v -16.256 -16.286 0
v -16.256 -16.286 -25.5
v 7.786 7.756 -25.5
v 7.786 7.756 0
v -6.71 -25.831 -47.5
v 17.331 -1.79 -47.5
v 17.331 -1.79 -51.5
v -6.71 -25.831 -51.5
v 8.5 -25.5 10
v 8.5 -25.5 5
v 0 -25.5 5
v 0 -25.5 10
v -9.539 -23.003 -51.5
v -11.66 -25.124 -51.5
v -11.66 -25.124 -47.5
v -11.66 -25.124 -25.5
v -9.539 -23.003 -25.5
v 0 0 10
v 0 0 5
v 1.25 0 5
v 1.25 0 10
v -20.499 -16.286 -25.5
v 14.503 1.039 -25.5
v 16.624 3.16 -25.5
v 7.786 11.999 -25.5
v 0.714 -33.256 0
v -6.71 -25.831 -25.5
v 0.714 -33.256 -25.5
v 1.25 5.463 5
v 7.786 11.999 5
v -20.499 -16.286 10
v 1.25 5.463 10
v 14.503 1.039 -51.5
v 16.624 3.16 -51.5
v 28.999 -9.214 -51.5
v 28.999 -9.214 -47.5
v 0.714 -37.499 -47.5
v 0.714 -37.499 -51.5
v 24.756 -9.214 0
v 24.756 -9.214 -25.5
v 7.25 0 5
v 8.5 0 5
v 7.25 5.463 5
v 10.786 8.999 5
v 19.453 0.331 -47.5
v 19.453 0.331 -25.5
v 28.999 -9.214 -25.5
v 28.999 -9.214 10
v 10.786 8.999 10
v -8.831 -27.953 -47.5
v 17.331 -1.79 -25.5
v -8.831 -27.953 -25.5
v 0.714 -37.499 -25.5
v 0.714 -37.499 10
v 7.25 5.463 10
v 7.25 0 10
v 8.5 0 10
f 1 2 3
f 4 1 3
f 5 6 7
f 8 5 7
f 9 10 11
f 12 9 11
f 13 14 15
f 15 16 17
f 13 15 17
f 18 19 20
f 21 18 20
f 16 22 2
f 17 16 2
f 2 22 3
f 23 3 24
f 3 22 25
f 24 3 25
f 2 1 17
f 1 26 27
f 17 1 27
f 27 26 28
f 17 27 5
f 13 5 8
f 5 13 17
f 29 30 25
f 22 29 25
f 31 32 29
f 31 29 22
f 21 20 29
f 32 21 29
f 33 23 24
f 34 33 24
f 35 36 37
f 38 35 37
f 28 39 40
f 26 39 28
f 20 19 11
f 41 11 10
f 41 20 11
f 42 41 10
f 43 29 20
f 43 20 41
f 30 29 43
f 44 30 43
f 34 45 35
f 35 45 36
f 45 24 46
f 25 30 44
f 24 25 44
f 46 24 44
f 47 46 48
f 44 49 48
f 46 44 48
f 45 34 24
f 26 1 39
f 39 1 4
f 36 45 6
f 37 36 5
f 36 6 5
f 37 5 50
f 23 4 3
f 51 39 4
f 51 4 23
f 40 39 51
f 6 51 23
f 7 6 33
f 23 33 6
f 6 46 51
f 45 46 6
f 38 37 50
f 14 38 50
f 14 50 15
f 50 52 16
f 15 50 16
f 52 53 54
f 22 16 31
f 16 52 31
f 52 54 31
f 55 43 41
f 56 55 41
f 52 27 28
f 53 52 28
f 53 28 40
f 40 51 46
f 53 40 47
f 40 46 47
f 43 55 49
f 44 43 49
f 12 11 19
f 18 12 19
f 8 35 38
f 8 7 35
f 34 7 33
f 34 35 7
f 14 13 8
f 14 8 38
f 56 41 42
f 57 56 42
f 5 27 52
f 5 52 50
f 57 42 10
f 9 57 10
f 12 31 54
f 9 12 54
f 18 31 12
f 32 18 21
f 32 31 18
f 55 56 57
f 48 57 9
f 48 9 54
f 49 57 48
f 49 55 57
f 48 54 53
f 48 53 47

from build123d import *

# Parameters (mm, degrees)
SKETCH_1_W          = 8.5
SKETCH_1_H          = 25.5
EXTRUDE_1_DEPTH     = 5
EXTRUDE_2_DEPTH     = 5
SKETCH_3_W          = 8.5
SKETCH_3_H          = 25.5
EXTRUDE_3_DEPTH     = 5
EXTRUDE_4_DEPTH     = 25.5
EXTRUDE_5_DEPTH     = 35.5
CUT_EXTRUDE_1_DEPTH = 5
CUT_EXTRUDE_2_DEPTH = 25.5
EXTRUDE_6_REACH     = 63.804
SKETCH_8_W          = 22
SKETCH_8_H          = 4
EXTRUDE_7_DEPTH     = 4
SKETCH_10_W         = 26
SKETCH_10_H         = 34
CUT_EXTRUDE_3_DEPTH = 4


with BuildPart() as part:
    # 草图1 → 凸台-拉伸1 (new body)
    with BuildSketch(Plane.XY):
        Polygon((-16.963203436, -12.75), (4.25, -33.963203436), (25.463203436, -12.75), (4.25, 8.463203436), align=None)
        with Locations((4.25, -12.75)):
            Rectangle(SKETCH_1_W, SKETCH_1_H, mode=Mode.SUBTRACT)
    extrude(amount=EXTRUDE_1_DEPTH)

    # 草图2 → 凸台-拉伸2 (add)
    with BuildSketch(Plane.XY.offset(5)):
        Polygon((1.25, 0), (1.25, 5.463203436), (-16.963203436, -12.75), (4.25, -33.963203436), (25.463203436, -12.75), (7.25, 5.463203436), (7.25, 0), (8.5, 0), (8.5, -25.5), (0, -25.5), (0, 0), align=None)
    extrude(amount=EXTRUDE_2_DEPTH)

    # 草图3 → 凸台-拉伸3 (add)
    with BuildSketch(Plane.XY.offset(5)):
        with Locations((4.25, -12.75)):
            Rectangle(SKETCH_3_W, SKETCH_3_H)
    extrude(amount=-EXTRUDE_3_DEPTH)

    # 草图4 → 凸台-拉伸4 (add)
    with BuildSketch(Plane(origin=(0, 0, 0), x_dir=(-1, 0, 0), z_dir=(0, 0, -1))):
        Polygon((-25.463203436, -12.75), (-4.25, -33.963203436), (16.963203436, -12.75), (-4.25, 8.463203436), align=None)
        Polygon((12.720562748, -12.75), (-4.25, 4.220562748), (-21.220562748, -12.75), (-4.25, -29.720562748), align=None, mode=Mode.SUBTRACT)
    extrude(amount=EXTRUDE_4_DEPTH)

    # 草图5 → 凸台-拉伸5 (add)
    with BuildSketch(Plane.XY.offset(10)):
        Polygon((4.25, 8.463203436), (25.463203436, -12.75), (28.998737342, -9.214466094), (7.785533906, 11.998737342), align=None)
        Polygon((-16.963203436, -12.75), (-20.498737342, -16.285533906), (0.714466094, -37.498737342), (4.25, -33.963203436), align=None)
    extrude(amount=-EXTRUDE_5_DEPTH)

    # 草图6 → 切除-拉伸1 (cut)
    with BuildSketch(Plane.XY.offset(10)):
        Polygon((7.25, 5.463203436), (10.785533906, 8.998737342), (7.785533906, 11.998737342), (4.25, 8.463203436), align=None)
    extrude(amount=-CUT_EXTRUDE_1_DEPTH, mode=Mode.SUBTRACT)

    # 草图7 → 切除-拉伸2 (cut)
    with BuildSketch(Plane(origin=(0, 0, -25.5), x_dir=(-1, 0, 0), z_dir=(0, 0, -1))):
        Polygon((-4.25, 4.220562748), (-7.785533906, 7.756096654), (-24.756096654, -9.214466094), (-21.220562748, -12.75), align=None)
        Polygon((12.720562748, -12.75), (16.256096654, -16.285533906), (-0.714466094, -33.256096654), (-4.25, -29.720562748), align=None)
    extrude(amount=-CUT_EXTRUDE_2_DEPTH, mode=Mode.SUBTRACT)

    # 凸台-拉伸6: up to this face of the body (flat: up to its plane)
    extrude_6_end = Plane(part.part.faces().sort_by_distance((-9.892135624, -26.892135624, -7.75))[0])
    # 草图8 → 凸台-拉伸6 (add, up to the picked face)
    with BuildSketch(Plane(origin=(9.892135624, 9.892135624, 0), x_dir=(0, 0, -1), z_dir=(0.7071067811865537, 0.7071067811865415, 0)), mode=Mode.PRIVATE) as extrude_6_sk1:
        with Locations((36.5, -11.52081528)):
            Rectangle(SKETCH_8_W, SKETCH_8_H)
    extrude_6_tool1 = split(extrude(extrude_6_sk1.sketch, amount=-EXTRUDE_6_REACH, mode=Mode.PRIVATE), bisect_by=extrude_6_end, keep=Keep.BOTH, mode=Mode.PRIVATE)
    add(extrude_6_tool1.solids().sort_by(Axis((18.038582, 1.745689, -36.5), (-0.7071067811865537, -0.7071067811865415, 0)))[0])

    # 草图9 → 凸台-拉伸7 (add)
    with BuildSketch(Plane(origin=(0, 0, -47.5), x_dir=(-1, 0, 0), z_dir=(0, 0, -1))):
        Polygon((-16.624368671, 3.159902577), (-28.998737342, -9.214466094), (-0.714466094, -37.498737342), (11.659902577, -25.124368671), align=None)
    extrude(amount=EXTRUDE_7_DEPTH)

    # 草图10 → 切除-拉伸3 (cut)
    with BuildSketch(Plane(origin=(9.560660172, -9.560660172, 0), x_dir=(0, 0, -1), z_dir=(0.7071067811865416, -0.7071067811865536, 0))):
        with Locations((38.5, -6.01040764)):
            Rectangle(SKETCH_10_W, SKETCH_10_H)
    extrude(amount=-CUT_EXTRUDE_3_DEPTH, mode=Mode.SUBTRACT)


solid = part.part
